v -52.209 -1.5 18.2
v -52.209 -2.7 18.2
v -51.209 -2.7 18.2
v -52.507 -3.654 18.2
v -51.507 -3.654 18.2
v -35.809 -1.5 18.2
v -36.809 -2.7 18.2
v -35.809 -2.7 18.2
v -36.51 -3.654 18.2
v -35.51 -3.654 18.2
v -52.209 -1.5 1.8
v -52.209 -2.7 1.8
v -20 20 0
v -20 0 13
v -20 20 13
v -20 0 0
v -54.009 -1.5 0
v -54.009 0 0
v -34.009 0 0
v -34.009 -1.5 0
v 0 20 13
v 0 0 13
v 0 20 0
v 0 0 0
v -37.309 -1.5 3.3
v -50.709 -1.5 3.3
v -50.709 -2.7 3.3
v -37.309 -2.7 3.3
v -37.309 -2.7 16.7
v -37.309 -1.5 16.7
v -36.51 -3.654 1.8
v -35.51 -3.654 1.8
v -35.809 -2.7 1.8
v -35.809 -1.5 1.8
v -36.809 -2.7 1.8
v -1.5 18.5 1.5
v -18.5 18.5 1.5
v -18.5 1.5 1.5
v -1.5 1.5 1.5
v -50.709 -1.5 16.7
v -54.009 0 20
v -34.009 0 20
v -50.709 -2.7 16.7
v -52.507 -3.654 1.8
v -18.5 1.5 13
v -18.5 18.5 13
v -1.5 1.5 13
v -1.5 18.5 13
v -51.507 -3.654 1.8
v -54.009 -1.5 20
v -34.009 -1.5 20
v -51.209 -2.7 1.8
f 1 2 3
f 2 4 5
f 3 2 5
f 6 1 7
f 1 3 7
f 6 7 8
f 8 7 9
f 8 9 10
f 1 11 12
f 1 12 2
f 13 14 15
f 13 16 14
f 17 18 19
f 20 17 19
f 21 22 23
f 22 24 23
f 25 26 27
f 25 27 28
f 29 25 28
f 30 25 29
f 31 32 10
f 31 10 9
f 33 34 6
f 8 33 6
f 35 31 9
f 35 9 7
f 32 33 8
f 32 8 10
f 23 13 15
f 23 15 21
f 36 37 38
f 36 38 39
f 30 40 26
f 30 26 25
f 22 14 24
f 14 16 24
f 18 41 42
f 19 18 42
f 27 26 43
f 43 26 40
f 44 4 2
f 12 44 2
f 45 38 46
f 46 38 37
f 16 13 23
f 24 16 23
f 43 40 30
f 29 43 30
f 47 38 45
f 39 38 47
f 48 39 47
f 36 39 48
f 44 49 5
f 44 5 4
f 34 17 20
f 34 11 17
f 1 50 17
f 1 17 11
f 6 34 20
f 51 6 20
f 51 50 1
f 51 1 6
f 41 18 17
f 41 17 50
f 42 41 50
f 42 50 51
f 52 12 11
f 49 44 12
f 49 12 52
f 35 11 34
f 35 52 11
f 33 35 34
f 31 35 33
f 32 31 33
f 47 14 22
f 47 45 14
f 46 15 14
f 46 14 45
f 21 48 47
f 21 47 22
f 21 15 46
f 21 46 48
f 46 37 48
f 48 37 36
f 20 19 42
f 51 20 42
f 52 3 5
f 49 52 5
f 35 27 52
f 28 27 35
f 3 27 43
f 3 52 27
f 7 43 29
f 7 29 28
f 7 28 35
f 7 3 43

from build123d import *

# Parameters (mm, degrees)
F0_W     = 20
F0_H     = 20
F1_DEPTH = 1.5
F2_W     = 20
F2_H     = 20
F2_W_2   = 17
F2_H_2   = 17
F3_DEPTH = 11.5
F4_W     = 20
F4_H     = 20
F5_DEPTH = 1.5
F6_W     = 16.4
F6_H     = 16.4
F6_W_2   = 13.4
F6_H_2   = 13.4
F7_DEPTH = 1.2
F9_DEPTH = 16.4


with BuildPart() as f1:
    # F0 (on Top) → F1 (new body)
    with BuildSketch(Plane.XY):
        with Locations((-10, 10)):
            Rectangle(F0_W, F0_H)
    extrude(amount=F1_DEPTH)

    # F2 (on face) → F3 (join)
    with BuildSketch(Plane.XY.offset(1.5)):
        with Locations((-10, 10)):
            Rectangle(F2_W, F2_H)
        with Locations((-10, 10)):
            Rectangle(F2_W_2, F2_H_2, mode=Mode.SUBTRACT)
    extrude(amount=F3_DEPTH)


with BuildPart() as f5:
    # F4 (on Front) → F5 (new body)
    with BuildSketch(Plane.XZ):
        with Locations((-44.008897, 10)):
            Rectangle(F4_W, F4_H)
    extrude(amount=F5_DEPTH)

    # F6 (on face) → F7 (join)
    with BuildSketch(Plane.XZ.offset(1.5)):
        with Locations((-44.008897, 10)):
            Rectangle(F6_W, F6_H)
        with Locations((-44.008897, 10)):
            Rectangle(F6_W_2, F6_H_2, mode=Mode.SUBTRACT)
    extrude(amount=F7_DEPTH)

    # F8 (on face) → F9 (join)
    with BuildSketch(Plane(origin=(0, 0, 1.8), x_dir=(1, 0, 0), z_dir=(0, 0, -1))):
        Polygon((-52.50749, 3.654381), (-52.208897, 2.7), (-51.208897, 2.7), (-51.50749, 3.654381), align=None)
        Polygon((-35.510305, 3.654381), (-36.510305, 3.654381), (-36.808897, 2.7), (-35.808897, 2.7), align=None)
    extrude(amount=-F9_DEPTH)


solid = Compound([f1.part, f5.part])
